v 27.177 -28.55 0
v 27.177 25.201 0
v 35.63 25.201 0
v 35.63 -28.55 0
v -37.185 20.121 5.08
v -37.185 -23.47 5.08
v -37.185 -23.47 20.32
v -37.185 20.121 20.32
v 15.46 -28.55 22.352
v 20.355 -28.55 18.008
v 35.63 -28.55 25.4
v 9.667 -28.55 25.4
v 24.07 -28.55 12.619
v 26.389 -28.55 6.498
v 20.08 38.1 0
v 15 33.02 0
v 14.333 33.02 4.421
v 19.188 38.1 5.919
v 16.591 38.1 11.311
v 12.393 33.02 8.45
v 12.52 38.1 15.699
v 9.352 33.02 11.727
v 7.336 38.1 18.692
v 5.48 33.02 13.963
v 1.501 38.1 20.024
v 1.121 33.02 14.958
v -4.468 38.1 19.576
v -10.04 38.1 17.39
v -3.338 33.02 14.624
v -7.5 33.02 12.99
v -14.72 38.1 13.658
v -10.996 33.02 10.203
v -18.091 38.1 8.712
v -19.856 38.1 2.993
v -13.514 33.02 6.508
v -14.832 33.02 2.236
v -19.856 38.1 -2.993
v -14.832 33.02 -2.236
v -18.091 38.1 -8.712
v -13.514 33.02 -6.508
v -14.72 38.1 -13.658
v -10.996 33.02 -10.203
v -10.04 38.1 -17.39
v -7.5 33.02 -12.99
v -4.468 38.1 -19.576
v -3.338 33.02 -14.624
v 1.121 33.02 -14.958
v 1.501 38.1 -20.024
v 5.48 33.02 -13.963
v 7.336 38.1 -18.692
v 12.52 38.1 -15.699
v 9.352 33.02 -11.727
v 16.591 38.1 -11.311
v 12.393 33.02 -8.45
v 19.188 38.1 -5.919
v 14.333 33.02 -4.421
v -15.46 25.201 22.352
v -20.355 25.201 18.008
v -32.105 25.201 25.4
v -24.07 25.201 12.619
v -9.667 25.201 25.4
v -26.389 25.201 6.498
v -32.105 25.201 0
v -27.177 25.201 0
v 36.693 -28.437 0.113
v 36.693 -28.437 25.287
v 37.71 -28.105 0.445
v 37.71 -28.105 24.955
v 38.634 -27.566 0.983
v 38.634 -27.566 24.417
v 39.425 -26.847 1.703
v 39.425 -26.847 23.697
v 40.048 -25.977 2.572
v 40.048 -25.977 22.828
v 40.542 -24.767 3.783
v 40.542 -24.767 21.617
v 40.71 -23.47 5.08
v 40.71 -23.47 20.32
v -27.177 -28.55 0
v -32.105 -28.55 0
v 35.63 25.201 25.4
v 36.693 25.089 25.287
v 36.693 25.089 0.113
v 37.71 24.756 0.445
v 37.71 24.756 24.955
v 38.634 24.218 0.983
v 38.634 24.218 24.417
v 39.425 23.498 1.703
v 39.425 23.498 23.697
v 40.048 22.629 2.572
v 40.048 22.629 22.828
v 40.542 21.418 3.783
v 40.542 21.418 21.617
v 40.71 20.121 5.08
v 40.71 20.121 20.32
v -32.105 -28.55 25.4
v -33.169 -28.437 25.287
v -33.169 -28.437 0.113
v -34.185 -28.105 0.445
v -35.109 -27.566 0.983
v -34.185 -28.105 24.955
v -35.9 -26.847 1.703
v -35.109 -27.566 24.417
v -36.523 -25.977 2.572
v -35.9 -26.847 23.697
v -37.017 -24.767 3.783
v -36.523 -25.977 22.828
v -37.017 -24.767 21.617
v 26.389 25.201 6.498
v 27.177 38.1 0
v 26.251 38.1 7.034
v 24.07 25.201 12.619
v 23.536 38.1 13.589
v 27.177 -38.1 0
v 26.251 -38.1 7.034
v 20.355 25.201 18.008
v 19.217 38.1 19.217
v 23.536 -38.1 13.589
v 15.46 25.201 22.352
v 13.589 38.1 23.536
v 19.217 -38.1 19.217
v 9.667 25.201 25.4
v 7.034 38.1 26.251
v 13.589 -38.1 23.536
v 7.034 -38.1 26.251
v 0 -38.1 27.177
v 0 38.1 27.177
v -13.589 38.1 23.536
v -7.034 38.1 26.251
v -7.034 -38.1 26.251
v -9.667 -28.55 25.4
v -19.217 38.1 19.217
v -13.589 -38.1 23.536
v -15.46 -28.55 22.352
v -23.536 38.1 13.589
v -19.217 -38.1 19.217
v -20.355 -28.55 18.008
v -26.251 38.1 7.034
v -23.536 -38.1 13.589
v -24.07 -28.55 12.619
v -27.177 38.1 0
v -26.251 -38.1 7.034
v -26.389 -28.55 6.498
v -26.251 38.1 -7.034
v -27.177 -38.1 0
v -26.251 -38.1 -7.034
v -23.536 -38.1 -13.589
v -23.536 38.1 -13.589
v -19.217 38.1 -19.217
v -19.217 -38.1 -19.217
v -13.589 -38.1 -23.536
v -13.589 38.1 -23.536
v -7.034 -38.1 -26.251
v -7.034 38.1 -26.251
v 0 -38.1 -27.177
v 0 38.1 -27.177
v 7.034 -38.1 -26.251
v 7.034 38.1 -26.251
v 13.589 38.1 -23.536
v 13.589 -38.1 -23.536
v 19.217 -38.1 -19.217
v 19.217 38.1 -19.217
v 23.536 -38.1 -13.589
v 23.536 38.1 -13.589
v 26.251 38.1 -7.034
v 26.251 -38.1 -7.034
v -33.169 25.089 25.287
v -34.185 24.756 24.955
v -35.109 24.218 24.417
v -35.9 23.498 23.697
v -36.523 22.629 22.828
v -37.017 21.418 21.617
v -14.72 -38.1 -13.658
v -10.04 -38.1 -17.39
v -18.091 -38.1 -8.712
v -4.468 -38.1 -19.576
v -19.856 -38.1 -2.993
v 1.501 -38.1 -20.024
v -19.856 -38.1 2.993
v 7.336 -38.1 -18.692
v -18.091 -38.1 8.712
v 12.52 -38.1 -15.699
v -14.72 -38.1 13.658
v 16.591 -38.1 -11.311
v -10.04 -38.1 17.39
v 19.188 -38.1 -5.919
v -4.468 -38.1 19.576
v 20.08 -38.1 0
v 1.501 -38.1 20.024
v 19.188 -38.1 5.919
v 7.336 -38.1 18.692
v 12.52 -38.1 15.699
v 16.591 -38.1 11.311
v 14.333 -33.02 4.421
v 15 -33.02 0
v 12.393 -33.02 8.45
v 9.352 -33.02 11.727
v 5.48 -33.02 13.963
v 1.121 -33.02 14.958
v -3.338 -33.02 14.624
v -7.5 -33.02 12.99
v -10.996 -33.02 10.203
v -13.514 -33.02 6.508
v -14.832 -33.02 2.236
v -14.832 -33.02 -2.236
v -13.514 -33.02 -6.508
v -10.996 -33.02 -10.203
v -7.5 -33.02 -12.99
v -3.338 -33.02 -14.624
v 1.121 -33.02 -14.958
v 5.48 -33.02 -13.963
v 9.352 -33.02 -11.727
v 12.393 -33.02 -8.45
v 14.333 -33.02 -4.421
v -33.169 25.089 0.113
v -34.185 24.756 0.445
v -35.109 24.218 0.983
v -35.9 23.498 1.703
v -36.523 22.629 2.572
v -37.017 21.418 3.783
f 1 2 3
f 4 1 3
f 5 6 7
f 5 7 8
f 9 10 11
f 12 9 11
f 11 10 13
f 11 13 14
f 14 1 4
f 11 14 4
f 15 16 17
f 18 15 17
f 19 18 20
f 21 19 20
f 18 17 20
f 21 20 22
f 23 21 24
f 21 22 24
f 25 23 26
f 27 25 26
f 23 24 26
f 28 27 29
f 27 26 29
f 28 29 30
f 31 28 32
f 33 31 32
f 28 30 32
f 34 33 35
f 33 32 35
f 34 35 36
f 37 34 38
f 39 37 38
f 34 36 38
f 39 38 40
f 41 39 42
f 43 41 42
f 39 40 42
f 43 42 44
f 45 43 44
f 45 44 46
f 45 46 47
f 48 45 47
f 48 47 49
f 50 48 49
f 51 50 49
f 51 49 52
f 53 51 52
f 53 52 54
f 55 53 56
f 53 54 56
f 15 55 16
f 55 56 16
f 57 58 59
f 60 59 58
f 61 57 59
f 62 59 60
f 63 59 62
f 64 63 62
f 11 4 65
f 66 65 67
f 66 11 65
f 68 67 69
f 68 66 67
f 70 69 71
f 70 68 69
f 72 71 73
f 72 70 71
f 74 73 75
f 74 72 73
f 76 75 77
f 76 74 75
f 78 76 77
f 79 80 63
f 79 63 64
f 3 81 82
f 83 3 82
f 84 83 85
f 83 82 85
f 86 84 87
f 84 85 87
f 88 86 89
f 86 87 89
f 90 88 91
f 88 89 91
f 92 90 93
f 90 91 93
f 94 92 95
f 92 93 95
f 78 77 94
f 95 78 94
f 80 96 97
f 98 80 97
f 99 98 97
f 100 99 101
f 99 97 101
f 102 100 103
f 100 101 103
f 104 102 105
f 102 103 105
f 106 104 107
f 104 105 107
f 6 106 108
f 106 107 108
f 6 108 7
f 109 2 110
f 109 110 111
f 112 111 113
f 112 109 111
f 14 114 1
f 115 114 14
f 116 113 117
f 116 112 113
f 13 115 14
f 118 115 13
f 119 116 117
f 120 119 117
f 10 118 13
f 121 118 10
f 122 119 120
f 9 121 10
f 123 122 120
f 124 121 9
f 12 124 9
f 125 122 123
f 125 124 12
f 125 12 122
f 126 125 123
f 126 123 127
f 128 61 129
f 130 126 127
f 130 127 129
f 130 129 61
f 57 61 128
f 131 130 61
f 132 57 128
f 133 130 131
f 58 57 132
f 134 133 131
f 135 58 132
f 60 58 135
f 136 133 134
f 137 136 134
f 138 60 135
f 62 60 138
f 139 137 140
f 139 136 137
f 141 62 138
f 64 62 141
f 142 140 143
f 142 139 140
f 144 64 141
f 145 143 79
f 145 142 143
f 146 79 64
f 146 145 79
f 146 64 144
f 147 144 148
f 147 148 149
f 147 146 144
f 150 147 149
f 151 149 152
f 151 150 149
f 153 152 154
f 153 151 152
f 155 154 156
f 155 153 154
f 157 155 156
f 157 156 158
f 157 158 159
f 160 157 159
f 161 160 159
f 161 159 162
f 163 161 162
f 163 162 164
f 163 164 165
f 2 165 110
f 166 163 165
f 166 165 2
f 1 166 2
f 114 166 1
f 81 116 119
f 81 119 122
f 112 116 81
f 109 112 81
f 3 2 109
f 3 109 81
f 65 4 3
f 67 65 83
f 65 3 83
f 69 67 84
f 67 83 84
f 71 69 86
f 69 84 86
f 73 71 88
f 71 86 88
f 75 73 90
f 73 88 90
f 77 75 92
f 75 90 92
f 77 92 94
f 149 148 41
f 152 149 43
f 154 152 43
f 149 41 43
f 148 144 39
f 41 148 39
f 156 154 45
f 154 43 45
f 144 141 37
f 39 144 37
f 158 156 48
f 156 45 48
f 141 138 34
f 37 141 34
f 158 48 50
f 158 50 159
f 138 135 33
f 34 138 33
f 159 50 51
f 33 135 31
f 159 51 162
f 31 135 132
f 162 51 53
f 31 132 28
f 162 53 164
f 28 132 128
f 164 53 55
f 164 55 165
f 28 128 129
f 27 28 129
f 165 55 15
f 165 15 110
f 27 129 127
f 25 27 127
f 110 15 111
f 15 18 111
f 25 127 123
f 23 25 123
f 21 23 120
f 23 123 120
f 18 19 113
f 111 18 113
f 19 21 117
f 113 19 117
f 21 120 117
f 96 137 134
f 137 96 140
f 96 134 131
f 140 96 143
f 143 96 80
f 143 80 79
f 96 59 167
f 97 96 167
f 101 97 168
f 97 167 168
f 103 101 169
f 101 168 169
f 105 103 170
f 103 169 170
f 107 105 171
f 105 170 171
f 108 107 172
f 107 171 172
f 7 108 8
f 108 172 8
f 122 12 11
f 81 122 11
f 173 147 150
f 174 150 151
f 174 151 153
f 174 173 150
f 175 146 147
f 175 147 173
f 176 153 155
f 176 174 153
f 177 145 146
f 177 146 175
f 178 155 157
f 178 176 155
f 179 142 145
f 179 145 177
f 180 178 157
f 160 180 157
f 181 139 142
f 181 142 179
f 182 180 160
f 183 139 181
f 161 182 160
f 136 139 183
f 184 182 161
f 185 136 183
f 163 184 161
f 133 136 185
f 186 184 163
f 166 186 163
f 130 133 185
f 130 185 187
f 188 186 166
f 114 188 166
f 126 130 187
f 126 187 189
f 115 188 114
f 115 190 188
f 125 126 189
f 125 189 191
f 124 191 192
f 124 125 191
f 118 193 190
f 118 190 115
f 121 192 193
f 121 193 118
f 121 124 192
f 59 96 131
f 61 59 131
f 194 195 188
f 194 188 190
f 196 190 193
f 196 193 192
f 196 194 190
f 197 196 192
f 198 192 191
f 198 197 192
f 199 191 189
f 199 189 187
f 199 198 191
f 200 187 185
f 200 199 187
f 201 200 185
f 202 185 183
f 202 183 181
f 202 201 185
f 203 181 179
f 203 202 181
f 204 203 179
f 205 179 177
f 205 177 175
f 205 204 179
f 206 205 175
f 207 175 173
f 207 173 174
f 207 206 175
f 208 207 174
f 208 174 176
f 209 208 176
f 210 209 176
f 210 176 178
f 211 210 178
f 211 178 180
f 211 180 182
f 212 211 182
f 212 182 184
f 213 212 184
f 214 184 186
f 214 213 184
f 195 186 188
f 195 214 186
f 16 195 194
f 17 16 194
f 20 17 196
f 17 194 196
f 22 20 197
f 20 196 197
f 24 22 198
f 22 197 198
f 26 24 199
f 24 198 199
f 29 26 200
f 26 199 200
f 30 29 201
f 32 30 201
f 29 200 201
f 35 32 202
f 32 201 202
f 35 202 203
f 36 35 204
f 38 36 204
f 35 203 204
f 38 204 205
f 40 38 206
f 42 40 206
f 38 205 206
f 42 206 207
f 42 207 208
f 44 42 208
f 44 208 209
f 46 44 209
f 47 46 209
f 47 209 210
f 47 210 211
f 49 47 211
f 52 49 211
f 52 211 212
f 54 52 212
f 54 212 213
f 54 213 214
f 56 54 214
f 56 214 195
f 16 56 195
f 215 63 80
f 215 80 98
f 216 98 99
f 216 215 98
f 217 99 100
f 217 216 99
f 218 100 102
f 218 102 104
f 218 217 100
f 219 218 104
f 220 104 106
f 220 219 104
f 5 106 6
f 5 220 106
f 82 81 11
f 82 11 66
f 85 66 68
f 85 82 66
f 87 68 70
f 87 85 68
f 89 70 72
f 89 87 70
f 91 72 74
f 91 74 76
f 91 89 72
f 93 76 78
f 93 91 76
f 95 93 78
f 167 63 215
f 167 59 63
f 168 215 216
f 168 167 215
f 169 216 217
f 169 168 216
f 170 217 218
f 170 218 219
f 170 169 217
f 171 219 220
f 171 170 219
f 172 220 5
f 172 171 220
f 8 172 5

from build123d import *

# Parameters (mm, degrees)
F1_W     = 77.895202
F1_H     = 53.751212
F2_DEPTH = 25.4
F0_R     = 27.177432
F3_DEPTH = 38.1
F4_R     = 5.08
F5_R     = 14.999896
F6_DEPTH = 76.201
F7_SIZE  = 5.08


with BuildPart() as f2:
    # F1 (on Top) → F2 (new body)
    with BuildSketch(Plane.XY):
        with Locations((1.762334, -1.674218)):
            Rectangle(F1_W, F1_H)
    extrude(amount=F2_DEPTH)

    # F0 (on Front) → F3 (join, symmetric)
    with BuildSketch(Plane.XZ):
        Circle(F0_R)
    extrude(amount=F3_DEPTH, both=True)

    # F4
    f4_edges = [f2.edges().sort_by_distance(p)[0] for p in [
        (40.709935, -28.549824, 12.7),
        (40.709935, 25.201388, 12.7),
        (40.709935, -1.674218, 0),
        (40.709935, -1.674218, 25.4),
        (-37.185267, 25.201388, 12.7),
        (-37.185267, -28.549824, 12.7),
        (-37.185267, -1.674218, 0),
        (-37.185267, -1.674218, 25.4),
    ]]
    fillet(f4_edges, radius=F4_R)

    # F5 (on face) → F6 (cut, through all)
    with BuildSketch(Plane.XZ.offset(38.1)):
        Circle(F5_R)
    extrude(amount=-F6_DEPTH, mode=Mode.SUBTRACT)

    # F7
    f7_edges = [f2.edges().sort_by_distance(p)[0] for p in [
        (-14.999896, -38.1, 0),
        (-14.999896, 38.1, 0),
    ]]
    chamfer(f7_edges, length=F7_SIZE)


solid = f2.part
